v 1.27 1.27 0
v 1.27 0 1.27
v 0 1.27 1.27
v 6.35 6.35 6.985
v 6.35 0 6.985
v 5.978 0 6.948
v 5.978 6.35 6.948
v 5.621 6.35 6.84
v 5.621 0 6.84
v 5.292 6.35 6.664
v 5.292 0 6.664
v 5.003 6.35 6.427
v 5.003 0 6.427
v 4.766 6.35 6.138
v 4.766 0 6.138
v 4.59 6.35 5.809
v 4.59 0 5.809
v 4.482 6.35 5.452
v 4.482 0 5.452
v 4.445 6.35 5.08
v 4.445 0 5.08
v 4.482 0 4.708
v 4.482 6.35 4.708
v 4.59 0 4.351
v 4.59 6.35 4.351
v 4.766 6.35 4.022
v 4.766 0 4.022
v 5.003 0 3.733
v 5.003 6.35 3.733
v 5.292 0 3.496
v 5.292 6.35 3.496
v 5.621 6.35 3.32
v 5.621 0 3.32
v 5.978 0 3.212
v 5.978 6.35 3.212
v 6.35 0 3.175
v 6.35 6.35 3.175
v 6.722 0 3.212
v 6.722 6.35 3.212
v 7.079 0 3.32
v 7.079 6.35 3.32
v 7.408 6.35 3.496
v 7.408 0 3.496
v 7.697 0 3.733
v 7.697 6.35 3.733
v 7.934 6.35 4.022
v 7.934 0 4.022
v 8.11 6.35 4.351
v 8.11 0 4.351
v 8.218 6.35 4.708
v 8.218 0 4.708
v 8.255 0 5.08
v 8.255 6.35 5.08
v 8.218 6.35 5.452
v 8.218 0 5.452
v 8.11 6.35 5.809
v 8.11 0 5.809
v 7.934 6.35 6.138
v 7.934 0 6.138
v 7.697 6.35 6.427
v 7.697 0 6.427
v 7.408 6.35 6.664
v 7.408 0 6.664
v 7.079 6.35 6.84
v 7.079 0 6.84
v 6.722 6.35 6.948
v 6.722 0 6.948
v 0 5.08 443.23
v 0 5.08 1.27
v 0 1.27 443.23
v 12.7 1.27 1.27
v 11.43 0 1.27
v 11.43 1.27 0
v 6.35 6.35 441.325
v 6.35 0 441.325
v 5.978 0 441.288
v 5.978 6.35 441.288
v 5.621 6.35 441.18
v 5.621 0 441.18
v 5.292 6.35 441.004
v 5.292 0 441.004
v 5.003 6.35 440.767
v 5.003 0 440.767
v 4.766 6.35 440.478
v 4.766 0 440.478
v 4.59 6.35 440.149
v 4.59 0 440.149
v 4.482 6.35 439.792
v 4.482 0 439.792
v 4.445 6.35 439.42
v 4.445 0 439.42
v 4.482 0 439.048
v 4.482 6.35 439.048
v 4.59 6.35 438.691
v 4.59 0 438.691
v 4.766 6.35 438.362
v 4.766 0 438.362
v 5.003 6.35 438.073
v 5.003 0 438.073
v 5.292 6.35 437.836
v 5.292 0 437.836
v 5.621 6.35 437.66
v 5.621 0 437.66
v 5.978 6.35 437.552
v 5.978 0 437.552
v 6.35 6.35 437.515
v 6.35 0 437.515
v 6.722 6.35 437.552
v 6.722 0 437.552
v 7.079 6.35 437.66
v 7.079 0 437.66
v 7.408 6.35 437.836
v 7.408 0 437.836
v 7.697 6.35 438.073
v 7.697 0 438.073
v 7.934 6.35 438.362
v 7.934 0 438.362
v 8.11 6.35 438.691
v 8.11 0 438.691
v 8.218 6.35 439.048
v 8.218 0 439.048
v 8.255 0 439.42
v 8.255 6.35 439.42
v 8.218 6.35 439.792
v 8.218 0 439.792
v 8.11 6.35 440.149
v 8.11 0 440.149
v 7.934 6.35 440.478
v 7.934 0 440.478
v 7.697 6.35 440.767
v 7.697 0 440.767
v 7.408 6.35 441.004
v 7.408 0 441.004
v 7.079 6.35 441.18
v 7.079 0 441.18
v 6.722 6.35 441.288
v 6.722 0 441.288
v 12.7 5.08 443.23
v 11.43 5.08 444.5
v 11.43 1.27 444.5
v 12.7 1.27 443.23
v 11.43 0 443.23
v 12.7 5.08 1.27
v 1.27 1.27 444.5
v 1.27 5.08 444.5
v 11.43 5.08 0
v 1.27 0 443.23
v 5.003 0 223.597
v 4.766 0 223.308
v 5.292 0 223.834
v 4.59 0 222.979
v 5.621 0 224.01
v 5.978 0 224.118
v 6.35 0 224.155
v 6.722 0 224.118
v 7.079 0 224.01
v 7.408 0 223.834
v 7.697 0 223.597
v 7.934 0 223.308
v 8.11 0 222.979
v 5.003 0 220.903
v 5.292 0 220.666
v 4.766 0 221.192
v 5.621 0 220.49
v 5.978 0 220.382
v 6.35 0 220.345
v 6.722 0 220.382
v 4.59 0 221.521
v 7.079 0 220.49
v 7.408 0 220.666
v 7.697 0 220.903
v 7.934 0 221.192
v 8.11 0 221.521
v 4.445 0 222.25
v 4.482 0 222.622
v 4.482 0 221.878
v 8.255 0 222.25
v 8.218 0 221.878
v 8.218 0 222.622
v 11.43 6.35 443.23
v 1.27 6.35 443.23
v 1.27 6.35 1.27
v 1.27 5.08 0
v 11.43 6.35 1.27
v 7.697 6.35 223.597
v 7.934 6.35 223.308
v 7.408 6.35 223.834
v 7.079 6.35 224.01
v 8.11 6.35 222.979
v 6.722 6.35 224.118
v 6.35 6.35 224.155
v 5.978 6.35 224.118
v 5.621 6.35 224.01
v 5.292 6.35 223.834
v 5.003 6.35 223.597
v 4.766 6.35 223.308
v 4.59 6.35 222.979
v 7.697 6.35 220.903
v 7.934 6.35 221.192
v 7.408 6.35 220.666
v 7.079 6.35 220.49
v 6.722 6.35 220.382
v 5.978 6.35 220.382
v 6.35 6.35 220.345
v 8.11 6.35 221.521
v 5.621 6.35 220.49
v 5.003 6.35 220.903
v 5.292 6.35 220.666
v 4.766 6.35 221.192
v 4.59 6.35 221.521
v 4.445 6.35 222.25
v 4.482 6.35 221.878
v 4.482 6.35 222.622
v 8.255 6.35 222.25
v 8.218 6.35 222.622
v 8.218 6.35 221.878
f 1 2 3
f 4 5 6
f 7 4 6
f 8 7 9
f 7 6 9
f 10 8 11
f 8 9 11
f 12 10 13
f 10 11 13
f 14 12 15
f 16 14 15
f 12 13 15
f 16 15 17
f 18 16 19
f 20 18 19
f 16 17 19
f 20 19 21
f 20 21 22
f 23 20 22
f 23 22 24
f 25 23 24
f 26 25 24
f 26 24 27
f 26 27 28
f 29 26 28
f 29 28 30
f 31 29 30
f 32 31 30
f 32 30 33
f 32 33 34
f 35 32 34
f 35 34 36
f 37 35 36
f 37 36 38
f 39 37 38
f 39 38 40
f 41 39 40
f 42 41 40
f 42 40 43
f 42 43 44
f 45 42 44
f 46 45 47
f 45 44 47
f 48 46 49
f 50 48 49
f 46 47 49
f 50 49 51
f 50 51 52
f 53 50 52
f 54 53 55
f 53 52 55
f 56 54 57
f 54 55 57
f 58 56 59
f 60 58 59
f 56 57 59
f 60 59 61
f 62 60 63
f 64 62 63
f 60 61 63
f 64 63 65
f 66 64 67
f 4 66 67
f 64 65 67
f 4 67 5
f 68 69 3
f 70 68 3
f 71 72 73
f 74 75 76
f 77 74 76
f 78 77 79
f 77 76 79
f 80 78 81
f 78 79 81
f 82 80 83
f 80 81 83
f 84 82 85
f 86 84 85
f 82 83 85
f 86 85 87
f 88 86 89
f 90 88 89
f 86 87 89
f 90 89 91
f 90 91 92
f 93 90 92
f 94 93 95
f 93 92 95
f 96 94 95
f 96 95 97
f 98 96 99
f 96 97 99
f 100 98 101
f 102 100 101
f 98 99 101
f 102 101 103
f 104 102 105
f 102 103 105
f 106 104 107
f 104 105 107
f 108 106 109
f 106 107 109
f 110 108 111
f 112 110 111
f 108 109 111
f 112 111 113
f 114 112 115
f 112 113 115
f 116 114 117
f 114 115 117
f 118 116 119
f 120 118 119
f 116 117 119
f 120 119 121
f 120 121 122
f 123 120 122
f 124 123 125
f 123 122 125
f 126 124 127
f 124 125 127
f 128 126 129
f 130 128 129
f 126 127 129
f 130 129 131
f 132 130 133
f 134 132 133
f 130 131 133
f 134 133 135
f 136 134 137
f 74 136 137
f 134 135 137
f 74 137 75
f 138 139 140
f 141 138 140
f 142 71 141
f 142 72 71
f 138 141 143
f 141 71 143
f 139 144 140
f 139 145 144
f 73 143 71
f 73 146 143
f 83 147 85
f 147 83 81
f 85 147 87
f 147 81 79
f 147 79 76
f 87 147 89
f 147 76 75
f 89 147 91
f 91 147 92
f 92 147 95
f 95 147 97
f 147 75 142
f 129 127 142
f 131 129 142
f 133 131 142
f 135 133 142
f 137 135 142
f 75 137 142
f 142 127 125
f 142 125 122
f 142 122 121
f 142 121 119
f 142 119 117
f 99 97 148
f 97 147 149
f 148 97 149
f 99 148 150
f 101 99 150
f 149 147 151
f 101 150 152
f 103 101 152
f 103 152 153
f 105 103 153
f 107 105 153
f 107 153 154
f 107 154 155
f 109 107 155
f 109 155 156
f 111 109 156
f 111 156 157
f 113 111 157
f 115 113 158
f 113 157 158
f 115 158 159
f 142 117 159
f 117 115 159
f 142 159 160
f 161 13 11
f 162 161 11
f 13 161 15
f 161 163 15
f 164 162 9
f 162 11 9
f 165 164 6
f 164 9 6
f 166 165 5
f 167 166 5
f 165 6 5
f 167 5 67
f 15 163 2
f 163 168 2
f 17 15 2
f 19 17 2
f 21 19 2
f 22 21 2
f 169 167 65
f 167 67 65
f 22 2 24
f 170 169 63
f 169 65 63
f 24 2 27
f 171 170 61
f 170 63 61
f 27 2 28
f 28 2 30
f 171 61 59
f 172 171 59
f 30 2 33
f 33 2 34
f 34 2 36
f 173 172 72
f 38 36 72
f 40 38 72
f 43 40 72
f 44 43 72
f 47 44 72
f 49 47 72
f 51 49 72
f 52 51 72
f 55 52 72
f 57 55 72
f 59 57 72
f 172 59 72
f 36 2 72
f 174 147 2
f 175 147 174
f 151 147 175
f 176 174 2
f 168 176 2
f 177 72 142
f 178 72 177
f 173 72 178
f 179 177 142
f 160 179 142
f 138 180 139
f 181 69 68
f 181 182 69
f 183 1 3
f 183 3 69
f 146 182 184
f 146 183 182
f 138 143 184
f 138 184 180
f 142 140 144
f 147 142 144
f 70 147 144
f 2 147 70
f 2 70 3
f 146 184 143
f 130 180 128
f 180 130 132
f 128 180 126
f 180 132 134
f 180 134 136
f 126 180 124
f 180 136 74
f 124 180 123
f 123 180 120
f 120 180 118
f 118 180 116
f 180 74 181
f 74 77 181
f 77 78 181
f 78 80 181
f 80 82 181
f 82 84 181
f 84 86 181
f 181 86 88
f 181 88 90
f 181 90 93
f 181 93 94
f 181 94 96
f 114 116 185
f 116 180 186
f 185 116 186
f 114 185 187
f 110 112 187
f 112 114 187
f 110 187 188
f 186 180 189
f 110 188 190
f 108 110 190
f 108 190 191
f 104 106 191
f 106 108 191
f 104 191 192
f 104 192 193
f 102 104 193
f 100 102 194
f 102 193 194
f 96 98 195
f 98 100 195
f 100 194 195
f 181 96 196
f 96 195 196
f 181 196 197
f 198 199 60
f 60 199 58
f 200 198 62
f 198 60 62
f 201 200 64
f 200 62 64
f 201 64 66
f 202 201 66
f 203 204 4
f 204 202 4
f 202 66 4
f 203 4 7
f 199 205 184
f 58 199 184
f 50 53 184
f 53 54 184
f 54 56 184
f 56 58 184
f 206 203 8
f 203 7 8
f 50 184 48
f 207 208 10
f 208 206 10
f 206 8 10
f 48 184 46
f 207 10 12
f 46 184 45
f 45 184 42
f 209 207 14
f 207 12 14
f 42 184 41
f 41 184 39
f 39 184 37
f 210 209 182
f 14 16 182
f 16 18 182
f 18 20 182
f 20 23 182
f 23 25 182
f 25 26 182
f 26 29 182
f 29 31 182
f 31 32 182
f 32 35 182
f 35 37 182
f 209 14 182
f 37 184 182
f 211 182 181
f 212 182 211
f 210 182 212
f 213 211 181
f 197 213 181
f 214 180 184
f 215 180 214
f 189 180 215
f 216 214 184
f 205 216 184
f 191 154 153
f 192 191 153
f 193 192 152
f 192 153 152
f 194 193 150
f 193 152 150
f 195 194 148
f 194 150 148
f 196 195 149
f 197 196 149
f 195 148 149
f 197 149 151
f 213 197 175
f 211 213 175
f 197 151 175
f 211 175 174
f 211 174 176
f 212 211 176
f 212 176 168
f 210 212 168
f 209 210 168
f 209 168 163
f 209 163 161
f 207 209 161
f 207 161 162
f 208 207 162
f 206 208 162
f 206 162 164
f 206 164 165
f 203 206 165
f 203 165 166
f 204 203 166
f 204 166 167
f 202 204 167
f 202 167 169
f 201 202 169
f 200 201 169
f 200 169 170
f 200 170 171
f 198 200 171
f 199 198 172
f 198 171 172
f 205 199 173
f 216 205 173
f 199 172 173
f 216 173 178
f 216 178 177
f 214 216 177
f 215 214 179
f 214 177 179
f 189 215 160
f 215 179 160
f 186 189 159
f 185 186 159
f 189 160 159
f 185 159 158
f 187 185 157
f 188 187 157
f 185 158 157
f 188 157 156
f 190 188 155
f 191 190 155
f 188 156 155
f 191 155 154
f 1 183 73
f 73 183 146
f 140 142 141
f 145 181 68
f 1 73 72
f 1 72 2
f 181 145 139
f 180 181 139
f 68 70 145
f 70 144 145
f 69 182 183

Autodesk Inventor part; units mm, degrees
ref_plane "YZ Plane" through (0, 0, 0) normal (1, 0, 0) x (0, 1, 0)
ref_plane "XZ Plane" through (0, 0, 0) normal (0, 1, 0) x (-1, 0, 0)
ref_plane "XY Plane" through (0, 0, 0) normal (0, 0, 1) x (1, 0, 0)
sketch "Sketch1" plane through (0, 0, 0) normal (0, 0, 1) x (1, 0, 0)
  line L0 (0, 0) -> (12.7, 0)
  line L1 (12.7, 0) -> (12.7, 6.35)
  line L2 (12.7, 6.35) -> (0, 6.35)
  line L3 (0, 6.35) -> (0, 0)
  dimension "d0" = 12.7
  dimension "d1" = 6.35
extrude "Extrusion1" add sketch "Sketch1" along normal blind 444.5
chamfer "Chamfer2" distance 1.27 angle 45 12 edges at (12.7, 0, 222.25) (0, 0, 222.25) (12.7, 6.35, 222.25) (0, 6.35, 222.25) (6.35, 0, 444.5) (6.35, 6.35, 444.5) (6.35, 0, 0) (6.35, 6.35, 0) (12.7, 3.175, 0) (0, 3.175, 0) (0, 3.175, 444.5) (12.7, 3.175, 444.5)
sketch "Sketch3" plane through (1.27, 6.35, 1.27) normal (0, 1, 0) x (1, 0, 0)
  line L0 (10.16, 0) -> (10.16, -441.96) projected
  line L1 (0, 0) -> (10.16, 0) projected
  line L2 (0, -441.96) -> (10.16, -441.96) projected
  point P0 (-1.27, 1.27)
  point P1 (5.08, -3.81)
  point P2 (5.08, -220.98)
  point P3 (5.08, -438.15)
  point P4 (22.86, 0)
  point P5 (22.86, -441.96)
  dimension "d17" = 5.08
  dimension "d18" = 3.81
  dimension "d19" = 5.08
  dimension "d20" = 3.81
  dimension "d21" = 5.08
  dimension "d22" = 220.98
hole "Hole1" at (6.35, 6.35, 5.08) at (6.35, 6.35, 222.25) at (6.35, 6.35, 439.42) direction (0, -1, 0) diameter 3.81 end through all
equation "\"d19\" = d17"
equation "\"d20\" = d18"
equation "\"d21\" = d17"
properties part number "x-lift arm prototype piece"
